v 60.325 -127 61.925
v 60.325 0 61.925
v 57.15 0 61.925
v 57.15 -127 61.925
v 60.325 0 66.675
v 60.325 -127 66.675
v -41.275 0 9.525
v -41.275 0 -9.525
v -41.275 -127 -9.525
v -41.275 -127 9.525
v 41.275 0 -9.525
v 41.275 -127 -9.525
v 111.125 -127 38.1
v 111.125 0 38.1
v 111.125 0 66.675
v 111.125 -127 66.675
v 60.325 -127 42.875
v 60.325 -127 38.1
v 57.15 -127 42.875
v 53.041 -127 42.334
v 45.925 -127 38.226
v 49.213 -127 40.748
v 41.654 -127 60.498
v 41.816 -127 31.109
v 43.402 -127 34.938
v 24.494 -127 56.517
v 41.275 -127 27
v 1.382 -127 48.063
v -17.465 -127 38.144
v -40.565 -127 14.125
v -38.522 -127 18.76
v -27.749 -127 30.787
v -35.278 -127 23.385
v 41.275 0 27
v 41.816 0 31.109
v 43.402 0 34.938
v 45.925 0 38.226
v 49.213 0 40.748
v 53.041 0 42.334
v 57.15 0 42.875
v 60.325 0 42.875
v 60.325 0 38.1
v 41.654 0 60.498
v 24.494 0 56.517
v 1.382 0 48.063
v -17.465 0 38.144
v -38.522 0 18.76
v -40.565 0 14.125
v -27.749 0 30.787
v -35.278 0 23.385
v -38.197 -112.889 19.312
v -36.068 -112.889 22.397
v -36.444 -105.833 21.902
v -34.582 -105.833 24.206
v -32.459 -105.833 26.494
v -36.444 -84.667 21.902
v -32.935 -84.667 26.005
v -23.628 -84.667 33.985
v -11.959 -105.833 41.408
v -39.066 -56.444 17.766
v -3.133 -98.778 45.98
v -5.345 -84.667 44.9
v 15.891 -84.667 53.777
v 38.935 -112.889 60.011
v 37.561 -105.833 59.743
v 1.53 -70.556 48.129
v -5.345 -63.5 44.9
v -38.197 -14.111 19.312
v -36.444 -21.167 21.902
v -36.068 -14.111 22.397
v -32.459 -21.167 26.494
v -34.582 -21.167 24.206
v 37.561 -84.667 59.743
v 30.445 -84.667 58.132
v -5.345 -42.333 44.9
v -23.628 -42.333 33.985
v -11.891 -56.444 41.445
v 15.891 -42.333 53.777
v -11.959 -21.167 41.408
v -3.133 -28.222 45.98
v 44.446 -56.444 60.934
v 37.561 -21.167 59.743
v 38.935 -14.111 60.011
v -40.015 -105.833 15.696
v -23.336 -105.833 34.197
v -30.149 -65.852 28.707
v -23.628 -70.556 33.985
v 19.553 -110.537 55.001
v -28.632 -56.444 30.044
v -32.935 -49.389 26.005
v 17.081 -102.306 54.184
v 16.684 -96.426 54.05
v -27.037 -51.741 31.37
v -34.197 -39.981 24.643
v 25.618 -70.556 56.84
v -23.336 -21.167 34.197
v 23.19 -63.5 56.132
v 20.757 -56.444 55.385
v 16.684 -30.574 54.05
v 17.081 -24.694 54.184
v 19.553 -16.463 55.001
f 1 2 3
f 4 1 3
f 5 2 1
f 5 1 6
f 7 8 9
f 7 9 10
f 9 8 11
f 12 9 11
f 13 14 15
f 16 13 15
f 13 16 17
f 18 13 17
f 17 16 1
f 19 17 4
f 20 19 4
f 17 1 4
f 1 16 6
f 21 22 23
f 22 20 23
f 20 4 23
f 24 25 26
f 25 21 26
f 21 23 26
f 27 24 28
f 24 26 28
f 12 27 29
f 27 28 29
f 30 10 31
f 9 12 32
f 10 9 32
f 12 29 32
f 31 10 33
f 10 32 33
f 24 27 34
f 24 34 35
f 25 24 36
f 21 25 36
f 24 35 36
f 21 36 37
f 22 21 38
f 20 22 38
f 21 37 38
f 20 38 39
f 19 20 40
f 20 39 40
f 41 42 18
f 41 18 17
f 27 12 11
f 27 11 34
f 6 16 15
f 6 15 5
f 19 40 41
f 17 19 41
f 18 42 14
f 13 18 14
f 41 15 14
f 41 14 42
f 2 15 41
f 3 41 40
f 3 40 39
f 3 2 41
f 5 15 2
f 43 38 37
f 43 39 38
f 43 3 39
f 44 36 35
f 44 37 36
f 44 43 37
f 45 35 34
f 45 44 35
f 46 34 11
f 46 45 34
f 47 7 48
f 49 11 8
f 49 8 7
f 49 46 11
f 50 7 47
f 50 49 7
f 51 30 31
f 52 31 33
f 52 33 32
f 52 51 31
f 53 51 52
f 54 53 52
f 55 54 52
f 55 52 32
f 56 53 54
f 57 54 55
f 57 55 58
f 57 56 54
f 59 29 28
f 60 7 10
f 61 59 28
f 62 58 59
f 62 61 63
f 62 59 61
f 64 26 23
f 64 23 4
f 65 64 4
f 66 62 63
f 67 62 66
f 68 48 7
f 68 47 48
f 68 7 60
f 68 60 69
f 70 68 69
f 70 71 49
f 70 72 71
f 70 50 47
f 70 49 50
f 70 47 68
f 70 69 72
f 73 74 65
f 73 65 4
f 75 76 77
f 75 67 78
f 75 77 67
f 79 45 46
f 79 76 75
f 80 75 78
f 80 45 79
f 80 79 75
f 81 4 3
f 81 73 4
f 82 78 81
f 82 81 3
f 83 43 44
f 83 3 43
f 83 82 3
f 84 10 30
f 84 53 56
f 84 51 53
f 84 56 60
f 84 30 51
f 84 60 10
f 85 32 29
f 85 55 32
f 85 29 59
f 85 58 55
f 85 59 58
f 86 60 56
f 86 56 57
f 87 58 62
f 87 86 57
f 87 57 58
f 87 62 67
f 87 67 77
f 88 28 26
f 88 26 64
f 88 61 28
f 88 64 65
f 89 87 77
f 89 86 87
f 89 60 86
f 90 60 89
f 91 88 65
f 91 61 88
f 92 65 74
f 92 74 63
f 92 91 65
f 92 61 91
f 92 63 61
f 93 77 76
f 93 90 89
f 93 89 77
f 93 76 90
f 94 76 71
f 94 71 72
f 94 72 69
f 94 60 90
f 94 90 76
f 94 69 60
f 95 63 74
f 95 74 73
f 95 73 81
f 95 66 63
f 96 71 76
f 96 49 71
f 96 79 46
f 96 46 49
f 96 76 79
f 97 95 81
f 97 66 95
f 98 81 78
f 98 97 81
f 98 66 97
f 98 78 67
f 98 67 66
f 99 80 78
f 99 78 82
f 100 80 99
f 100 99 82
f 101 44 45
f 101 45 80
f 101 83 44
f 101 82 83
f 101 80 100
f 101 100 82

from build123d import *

# Parameters (mm, degrees)
F0_W     = 82.55
F0_H     = 19.05
F0_W_2   = 27.7625424093
F0_H_2   = 4.7498
F0_H_3   = 4.7752
F1_DEPTH = 127


with BuildPart() as f1:
    # F0 (on Front) → F1 (new body)
    with BuildSketch(Plane.XZ):
        with BuildLine():
            add(Edge.make_bspline(
                [(-41.275, 9.525), (-41.275, 33.9924029201), (21.7312667782, 61.9252), (57.15, 61.9252)],
                knots=[0, 0, 0, 0, 111.5045361635, 111.5045361635, 111.5045361635, 111.5045361635], degree=3))
            Line((-41.275, 9.525), (41.275, 9.525))
            Line((41.275, 9.525), (41.275, 27.0002))
            ThreePointArc((41.275, 27.0002), (45.9246798487, 38.2255201513), (57.15, 42.8752))
            Line((57.15, 42.8752), (60.325, 42.8752))
            Line((60.325, 42.8752), (60.325, 61.9252))
            Line((60.325, 61.9252), (57.15, 61.9252))
        make_face()
        Rectangle(F0_W, F0_H)
        with Locations((74.2062712047, 52.4002)):
            Rectangle(F0_W_2, F0_H)
        with Locations((74.2062712047, 64.3001)):
            Rectangle(F0_W_2, F0_H_2)
        with Locations((74.2062712047, 40.4876)):
            Rectangle(F0_W_2, F0_H_3)
        Polygon((88.0875424093, 66.675), (88.0875424093, 61.9252), (88.0875424093, 42.8752), (88.0875424093, 38.1), (111.125, 38.1), (111.125, 66.675), align=None)
    extrude(amount=F1_DEPTH)


solid = f1.part
